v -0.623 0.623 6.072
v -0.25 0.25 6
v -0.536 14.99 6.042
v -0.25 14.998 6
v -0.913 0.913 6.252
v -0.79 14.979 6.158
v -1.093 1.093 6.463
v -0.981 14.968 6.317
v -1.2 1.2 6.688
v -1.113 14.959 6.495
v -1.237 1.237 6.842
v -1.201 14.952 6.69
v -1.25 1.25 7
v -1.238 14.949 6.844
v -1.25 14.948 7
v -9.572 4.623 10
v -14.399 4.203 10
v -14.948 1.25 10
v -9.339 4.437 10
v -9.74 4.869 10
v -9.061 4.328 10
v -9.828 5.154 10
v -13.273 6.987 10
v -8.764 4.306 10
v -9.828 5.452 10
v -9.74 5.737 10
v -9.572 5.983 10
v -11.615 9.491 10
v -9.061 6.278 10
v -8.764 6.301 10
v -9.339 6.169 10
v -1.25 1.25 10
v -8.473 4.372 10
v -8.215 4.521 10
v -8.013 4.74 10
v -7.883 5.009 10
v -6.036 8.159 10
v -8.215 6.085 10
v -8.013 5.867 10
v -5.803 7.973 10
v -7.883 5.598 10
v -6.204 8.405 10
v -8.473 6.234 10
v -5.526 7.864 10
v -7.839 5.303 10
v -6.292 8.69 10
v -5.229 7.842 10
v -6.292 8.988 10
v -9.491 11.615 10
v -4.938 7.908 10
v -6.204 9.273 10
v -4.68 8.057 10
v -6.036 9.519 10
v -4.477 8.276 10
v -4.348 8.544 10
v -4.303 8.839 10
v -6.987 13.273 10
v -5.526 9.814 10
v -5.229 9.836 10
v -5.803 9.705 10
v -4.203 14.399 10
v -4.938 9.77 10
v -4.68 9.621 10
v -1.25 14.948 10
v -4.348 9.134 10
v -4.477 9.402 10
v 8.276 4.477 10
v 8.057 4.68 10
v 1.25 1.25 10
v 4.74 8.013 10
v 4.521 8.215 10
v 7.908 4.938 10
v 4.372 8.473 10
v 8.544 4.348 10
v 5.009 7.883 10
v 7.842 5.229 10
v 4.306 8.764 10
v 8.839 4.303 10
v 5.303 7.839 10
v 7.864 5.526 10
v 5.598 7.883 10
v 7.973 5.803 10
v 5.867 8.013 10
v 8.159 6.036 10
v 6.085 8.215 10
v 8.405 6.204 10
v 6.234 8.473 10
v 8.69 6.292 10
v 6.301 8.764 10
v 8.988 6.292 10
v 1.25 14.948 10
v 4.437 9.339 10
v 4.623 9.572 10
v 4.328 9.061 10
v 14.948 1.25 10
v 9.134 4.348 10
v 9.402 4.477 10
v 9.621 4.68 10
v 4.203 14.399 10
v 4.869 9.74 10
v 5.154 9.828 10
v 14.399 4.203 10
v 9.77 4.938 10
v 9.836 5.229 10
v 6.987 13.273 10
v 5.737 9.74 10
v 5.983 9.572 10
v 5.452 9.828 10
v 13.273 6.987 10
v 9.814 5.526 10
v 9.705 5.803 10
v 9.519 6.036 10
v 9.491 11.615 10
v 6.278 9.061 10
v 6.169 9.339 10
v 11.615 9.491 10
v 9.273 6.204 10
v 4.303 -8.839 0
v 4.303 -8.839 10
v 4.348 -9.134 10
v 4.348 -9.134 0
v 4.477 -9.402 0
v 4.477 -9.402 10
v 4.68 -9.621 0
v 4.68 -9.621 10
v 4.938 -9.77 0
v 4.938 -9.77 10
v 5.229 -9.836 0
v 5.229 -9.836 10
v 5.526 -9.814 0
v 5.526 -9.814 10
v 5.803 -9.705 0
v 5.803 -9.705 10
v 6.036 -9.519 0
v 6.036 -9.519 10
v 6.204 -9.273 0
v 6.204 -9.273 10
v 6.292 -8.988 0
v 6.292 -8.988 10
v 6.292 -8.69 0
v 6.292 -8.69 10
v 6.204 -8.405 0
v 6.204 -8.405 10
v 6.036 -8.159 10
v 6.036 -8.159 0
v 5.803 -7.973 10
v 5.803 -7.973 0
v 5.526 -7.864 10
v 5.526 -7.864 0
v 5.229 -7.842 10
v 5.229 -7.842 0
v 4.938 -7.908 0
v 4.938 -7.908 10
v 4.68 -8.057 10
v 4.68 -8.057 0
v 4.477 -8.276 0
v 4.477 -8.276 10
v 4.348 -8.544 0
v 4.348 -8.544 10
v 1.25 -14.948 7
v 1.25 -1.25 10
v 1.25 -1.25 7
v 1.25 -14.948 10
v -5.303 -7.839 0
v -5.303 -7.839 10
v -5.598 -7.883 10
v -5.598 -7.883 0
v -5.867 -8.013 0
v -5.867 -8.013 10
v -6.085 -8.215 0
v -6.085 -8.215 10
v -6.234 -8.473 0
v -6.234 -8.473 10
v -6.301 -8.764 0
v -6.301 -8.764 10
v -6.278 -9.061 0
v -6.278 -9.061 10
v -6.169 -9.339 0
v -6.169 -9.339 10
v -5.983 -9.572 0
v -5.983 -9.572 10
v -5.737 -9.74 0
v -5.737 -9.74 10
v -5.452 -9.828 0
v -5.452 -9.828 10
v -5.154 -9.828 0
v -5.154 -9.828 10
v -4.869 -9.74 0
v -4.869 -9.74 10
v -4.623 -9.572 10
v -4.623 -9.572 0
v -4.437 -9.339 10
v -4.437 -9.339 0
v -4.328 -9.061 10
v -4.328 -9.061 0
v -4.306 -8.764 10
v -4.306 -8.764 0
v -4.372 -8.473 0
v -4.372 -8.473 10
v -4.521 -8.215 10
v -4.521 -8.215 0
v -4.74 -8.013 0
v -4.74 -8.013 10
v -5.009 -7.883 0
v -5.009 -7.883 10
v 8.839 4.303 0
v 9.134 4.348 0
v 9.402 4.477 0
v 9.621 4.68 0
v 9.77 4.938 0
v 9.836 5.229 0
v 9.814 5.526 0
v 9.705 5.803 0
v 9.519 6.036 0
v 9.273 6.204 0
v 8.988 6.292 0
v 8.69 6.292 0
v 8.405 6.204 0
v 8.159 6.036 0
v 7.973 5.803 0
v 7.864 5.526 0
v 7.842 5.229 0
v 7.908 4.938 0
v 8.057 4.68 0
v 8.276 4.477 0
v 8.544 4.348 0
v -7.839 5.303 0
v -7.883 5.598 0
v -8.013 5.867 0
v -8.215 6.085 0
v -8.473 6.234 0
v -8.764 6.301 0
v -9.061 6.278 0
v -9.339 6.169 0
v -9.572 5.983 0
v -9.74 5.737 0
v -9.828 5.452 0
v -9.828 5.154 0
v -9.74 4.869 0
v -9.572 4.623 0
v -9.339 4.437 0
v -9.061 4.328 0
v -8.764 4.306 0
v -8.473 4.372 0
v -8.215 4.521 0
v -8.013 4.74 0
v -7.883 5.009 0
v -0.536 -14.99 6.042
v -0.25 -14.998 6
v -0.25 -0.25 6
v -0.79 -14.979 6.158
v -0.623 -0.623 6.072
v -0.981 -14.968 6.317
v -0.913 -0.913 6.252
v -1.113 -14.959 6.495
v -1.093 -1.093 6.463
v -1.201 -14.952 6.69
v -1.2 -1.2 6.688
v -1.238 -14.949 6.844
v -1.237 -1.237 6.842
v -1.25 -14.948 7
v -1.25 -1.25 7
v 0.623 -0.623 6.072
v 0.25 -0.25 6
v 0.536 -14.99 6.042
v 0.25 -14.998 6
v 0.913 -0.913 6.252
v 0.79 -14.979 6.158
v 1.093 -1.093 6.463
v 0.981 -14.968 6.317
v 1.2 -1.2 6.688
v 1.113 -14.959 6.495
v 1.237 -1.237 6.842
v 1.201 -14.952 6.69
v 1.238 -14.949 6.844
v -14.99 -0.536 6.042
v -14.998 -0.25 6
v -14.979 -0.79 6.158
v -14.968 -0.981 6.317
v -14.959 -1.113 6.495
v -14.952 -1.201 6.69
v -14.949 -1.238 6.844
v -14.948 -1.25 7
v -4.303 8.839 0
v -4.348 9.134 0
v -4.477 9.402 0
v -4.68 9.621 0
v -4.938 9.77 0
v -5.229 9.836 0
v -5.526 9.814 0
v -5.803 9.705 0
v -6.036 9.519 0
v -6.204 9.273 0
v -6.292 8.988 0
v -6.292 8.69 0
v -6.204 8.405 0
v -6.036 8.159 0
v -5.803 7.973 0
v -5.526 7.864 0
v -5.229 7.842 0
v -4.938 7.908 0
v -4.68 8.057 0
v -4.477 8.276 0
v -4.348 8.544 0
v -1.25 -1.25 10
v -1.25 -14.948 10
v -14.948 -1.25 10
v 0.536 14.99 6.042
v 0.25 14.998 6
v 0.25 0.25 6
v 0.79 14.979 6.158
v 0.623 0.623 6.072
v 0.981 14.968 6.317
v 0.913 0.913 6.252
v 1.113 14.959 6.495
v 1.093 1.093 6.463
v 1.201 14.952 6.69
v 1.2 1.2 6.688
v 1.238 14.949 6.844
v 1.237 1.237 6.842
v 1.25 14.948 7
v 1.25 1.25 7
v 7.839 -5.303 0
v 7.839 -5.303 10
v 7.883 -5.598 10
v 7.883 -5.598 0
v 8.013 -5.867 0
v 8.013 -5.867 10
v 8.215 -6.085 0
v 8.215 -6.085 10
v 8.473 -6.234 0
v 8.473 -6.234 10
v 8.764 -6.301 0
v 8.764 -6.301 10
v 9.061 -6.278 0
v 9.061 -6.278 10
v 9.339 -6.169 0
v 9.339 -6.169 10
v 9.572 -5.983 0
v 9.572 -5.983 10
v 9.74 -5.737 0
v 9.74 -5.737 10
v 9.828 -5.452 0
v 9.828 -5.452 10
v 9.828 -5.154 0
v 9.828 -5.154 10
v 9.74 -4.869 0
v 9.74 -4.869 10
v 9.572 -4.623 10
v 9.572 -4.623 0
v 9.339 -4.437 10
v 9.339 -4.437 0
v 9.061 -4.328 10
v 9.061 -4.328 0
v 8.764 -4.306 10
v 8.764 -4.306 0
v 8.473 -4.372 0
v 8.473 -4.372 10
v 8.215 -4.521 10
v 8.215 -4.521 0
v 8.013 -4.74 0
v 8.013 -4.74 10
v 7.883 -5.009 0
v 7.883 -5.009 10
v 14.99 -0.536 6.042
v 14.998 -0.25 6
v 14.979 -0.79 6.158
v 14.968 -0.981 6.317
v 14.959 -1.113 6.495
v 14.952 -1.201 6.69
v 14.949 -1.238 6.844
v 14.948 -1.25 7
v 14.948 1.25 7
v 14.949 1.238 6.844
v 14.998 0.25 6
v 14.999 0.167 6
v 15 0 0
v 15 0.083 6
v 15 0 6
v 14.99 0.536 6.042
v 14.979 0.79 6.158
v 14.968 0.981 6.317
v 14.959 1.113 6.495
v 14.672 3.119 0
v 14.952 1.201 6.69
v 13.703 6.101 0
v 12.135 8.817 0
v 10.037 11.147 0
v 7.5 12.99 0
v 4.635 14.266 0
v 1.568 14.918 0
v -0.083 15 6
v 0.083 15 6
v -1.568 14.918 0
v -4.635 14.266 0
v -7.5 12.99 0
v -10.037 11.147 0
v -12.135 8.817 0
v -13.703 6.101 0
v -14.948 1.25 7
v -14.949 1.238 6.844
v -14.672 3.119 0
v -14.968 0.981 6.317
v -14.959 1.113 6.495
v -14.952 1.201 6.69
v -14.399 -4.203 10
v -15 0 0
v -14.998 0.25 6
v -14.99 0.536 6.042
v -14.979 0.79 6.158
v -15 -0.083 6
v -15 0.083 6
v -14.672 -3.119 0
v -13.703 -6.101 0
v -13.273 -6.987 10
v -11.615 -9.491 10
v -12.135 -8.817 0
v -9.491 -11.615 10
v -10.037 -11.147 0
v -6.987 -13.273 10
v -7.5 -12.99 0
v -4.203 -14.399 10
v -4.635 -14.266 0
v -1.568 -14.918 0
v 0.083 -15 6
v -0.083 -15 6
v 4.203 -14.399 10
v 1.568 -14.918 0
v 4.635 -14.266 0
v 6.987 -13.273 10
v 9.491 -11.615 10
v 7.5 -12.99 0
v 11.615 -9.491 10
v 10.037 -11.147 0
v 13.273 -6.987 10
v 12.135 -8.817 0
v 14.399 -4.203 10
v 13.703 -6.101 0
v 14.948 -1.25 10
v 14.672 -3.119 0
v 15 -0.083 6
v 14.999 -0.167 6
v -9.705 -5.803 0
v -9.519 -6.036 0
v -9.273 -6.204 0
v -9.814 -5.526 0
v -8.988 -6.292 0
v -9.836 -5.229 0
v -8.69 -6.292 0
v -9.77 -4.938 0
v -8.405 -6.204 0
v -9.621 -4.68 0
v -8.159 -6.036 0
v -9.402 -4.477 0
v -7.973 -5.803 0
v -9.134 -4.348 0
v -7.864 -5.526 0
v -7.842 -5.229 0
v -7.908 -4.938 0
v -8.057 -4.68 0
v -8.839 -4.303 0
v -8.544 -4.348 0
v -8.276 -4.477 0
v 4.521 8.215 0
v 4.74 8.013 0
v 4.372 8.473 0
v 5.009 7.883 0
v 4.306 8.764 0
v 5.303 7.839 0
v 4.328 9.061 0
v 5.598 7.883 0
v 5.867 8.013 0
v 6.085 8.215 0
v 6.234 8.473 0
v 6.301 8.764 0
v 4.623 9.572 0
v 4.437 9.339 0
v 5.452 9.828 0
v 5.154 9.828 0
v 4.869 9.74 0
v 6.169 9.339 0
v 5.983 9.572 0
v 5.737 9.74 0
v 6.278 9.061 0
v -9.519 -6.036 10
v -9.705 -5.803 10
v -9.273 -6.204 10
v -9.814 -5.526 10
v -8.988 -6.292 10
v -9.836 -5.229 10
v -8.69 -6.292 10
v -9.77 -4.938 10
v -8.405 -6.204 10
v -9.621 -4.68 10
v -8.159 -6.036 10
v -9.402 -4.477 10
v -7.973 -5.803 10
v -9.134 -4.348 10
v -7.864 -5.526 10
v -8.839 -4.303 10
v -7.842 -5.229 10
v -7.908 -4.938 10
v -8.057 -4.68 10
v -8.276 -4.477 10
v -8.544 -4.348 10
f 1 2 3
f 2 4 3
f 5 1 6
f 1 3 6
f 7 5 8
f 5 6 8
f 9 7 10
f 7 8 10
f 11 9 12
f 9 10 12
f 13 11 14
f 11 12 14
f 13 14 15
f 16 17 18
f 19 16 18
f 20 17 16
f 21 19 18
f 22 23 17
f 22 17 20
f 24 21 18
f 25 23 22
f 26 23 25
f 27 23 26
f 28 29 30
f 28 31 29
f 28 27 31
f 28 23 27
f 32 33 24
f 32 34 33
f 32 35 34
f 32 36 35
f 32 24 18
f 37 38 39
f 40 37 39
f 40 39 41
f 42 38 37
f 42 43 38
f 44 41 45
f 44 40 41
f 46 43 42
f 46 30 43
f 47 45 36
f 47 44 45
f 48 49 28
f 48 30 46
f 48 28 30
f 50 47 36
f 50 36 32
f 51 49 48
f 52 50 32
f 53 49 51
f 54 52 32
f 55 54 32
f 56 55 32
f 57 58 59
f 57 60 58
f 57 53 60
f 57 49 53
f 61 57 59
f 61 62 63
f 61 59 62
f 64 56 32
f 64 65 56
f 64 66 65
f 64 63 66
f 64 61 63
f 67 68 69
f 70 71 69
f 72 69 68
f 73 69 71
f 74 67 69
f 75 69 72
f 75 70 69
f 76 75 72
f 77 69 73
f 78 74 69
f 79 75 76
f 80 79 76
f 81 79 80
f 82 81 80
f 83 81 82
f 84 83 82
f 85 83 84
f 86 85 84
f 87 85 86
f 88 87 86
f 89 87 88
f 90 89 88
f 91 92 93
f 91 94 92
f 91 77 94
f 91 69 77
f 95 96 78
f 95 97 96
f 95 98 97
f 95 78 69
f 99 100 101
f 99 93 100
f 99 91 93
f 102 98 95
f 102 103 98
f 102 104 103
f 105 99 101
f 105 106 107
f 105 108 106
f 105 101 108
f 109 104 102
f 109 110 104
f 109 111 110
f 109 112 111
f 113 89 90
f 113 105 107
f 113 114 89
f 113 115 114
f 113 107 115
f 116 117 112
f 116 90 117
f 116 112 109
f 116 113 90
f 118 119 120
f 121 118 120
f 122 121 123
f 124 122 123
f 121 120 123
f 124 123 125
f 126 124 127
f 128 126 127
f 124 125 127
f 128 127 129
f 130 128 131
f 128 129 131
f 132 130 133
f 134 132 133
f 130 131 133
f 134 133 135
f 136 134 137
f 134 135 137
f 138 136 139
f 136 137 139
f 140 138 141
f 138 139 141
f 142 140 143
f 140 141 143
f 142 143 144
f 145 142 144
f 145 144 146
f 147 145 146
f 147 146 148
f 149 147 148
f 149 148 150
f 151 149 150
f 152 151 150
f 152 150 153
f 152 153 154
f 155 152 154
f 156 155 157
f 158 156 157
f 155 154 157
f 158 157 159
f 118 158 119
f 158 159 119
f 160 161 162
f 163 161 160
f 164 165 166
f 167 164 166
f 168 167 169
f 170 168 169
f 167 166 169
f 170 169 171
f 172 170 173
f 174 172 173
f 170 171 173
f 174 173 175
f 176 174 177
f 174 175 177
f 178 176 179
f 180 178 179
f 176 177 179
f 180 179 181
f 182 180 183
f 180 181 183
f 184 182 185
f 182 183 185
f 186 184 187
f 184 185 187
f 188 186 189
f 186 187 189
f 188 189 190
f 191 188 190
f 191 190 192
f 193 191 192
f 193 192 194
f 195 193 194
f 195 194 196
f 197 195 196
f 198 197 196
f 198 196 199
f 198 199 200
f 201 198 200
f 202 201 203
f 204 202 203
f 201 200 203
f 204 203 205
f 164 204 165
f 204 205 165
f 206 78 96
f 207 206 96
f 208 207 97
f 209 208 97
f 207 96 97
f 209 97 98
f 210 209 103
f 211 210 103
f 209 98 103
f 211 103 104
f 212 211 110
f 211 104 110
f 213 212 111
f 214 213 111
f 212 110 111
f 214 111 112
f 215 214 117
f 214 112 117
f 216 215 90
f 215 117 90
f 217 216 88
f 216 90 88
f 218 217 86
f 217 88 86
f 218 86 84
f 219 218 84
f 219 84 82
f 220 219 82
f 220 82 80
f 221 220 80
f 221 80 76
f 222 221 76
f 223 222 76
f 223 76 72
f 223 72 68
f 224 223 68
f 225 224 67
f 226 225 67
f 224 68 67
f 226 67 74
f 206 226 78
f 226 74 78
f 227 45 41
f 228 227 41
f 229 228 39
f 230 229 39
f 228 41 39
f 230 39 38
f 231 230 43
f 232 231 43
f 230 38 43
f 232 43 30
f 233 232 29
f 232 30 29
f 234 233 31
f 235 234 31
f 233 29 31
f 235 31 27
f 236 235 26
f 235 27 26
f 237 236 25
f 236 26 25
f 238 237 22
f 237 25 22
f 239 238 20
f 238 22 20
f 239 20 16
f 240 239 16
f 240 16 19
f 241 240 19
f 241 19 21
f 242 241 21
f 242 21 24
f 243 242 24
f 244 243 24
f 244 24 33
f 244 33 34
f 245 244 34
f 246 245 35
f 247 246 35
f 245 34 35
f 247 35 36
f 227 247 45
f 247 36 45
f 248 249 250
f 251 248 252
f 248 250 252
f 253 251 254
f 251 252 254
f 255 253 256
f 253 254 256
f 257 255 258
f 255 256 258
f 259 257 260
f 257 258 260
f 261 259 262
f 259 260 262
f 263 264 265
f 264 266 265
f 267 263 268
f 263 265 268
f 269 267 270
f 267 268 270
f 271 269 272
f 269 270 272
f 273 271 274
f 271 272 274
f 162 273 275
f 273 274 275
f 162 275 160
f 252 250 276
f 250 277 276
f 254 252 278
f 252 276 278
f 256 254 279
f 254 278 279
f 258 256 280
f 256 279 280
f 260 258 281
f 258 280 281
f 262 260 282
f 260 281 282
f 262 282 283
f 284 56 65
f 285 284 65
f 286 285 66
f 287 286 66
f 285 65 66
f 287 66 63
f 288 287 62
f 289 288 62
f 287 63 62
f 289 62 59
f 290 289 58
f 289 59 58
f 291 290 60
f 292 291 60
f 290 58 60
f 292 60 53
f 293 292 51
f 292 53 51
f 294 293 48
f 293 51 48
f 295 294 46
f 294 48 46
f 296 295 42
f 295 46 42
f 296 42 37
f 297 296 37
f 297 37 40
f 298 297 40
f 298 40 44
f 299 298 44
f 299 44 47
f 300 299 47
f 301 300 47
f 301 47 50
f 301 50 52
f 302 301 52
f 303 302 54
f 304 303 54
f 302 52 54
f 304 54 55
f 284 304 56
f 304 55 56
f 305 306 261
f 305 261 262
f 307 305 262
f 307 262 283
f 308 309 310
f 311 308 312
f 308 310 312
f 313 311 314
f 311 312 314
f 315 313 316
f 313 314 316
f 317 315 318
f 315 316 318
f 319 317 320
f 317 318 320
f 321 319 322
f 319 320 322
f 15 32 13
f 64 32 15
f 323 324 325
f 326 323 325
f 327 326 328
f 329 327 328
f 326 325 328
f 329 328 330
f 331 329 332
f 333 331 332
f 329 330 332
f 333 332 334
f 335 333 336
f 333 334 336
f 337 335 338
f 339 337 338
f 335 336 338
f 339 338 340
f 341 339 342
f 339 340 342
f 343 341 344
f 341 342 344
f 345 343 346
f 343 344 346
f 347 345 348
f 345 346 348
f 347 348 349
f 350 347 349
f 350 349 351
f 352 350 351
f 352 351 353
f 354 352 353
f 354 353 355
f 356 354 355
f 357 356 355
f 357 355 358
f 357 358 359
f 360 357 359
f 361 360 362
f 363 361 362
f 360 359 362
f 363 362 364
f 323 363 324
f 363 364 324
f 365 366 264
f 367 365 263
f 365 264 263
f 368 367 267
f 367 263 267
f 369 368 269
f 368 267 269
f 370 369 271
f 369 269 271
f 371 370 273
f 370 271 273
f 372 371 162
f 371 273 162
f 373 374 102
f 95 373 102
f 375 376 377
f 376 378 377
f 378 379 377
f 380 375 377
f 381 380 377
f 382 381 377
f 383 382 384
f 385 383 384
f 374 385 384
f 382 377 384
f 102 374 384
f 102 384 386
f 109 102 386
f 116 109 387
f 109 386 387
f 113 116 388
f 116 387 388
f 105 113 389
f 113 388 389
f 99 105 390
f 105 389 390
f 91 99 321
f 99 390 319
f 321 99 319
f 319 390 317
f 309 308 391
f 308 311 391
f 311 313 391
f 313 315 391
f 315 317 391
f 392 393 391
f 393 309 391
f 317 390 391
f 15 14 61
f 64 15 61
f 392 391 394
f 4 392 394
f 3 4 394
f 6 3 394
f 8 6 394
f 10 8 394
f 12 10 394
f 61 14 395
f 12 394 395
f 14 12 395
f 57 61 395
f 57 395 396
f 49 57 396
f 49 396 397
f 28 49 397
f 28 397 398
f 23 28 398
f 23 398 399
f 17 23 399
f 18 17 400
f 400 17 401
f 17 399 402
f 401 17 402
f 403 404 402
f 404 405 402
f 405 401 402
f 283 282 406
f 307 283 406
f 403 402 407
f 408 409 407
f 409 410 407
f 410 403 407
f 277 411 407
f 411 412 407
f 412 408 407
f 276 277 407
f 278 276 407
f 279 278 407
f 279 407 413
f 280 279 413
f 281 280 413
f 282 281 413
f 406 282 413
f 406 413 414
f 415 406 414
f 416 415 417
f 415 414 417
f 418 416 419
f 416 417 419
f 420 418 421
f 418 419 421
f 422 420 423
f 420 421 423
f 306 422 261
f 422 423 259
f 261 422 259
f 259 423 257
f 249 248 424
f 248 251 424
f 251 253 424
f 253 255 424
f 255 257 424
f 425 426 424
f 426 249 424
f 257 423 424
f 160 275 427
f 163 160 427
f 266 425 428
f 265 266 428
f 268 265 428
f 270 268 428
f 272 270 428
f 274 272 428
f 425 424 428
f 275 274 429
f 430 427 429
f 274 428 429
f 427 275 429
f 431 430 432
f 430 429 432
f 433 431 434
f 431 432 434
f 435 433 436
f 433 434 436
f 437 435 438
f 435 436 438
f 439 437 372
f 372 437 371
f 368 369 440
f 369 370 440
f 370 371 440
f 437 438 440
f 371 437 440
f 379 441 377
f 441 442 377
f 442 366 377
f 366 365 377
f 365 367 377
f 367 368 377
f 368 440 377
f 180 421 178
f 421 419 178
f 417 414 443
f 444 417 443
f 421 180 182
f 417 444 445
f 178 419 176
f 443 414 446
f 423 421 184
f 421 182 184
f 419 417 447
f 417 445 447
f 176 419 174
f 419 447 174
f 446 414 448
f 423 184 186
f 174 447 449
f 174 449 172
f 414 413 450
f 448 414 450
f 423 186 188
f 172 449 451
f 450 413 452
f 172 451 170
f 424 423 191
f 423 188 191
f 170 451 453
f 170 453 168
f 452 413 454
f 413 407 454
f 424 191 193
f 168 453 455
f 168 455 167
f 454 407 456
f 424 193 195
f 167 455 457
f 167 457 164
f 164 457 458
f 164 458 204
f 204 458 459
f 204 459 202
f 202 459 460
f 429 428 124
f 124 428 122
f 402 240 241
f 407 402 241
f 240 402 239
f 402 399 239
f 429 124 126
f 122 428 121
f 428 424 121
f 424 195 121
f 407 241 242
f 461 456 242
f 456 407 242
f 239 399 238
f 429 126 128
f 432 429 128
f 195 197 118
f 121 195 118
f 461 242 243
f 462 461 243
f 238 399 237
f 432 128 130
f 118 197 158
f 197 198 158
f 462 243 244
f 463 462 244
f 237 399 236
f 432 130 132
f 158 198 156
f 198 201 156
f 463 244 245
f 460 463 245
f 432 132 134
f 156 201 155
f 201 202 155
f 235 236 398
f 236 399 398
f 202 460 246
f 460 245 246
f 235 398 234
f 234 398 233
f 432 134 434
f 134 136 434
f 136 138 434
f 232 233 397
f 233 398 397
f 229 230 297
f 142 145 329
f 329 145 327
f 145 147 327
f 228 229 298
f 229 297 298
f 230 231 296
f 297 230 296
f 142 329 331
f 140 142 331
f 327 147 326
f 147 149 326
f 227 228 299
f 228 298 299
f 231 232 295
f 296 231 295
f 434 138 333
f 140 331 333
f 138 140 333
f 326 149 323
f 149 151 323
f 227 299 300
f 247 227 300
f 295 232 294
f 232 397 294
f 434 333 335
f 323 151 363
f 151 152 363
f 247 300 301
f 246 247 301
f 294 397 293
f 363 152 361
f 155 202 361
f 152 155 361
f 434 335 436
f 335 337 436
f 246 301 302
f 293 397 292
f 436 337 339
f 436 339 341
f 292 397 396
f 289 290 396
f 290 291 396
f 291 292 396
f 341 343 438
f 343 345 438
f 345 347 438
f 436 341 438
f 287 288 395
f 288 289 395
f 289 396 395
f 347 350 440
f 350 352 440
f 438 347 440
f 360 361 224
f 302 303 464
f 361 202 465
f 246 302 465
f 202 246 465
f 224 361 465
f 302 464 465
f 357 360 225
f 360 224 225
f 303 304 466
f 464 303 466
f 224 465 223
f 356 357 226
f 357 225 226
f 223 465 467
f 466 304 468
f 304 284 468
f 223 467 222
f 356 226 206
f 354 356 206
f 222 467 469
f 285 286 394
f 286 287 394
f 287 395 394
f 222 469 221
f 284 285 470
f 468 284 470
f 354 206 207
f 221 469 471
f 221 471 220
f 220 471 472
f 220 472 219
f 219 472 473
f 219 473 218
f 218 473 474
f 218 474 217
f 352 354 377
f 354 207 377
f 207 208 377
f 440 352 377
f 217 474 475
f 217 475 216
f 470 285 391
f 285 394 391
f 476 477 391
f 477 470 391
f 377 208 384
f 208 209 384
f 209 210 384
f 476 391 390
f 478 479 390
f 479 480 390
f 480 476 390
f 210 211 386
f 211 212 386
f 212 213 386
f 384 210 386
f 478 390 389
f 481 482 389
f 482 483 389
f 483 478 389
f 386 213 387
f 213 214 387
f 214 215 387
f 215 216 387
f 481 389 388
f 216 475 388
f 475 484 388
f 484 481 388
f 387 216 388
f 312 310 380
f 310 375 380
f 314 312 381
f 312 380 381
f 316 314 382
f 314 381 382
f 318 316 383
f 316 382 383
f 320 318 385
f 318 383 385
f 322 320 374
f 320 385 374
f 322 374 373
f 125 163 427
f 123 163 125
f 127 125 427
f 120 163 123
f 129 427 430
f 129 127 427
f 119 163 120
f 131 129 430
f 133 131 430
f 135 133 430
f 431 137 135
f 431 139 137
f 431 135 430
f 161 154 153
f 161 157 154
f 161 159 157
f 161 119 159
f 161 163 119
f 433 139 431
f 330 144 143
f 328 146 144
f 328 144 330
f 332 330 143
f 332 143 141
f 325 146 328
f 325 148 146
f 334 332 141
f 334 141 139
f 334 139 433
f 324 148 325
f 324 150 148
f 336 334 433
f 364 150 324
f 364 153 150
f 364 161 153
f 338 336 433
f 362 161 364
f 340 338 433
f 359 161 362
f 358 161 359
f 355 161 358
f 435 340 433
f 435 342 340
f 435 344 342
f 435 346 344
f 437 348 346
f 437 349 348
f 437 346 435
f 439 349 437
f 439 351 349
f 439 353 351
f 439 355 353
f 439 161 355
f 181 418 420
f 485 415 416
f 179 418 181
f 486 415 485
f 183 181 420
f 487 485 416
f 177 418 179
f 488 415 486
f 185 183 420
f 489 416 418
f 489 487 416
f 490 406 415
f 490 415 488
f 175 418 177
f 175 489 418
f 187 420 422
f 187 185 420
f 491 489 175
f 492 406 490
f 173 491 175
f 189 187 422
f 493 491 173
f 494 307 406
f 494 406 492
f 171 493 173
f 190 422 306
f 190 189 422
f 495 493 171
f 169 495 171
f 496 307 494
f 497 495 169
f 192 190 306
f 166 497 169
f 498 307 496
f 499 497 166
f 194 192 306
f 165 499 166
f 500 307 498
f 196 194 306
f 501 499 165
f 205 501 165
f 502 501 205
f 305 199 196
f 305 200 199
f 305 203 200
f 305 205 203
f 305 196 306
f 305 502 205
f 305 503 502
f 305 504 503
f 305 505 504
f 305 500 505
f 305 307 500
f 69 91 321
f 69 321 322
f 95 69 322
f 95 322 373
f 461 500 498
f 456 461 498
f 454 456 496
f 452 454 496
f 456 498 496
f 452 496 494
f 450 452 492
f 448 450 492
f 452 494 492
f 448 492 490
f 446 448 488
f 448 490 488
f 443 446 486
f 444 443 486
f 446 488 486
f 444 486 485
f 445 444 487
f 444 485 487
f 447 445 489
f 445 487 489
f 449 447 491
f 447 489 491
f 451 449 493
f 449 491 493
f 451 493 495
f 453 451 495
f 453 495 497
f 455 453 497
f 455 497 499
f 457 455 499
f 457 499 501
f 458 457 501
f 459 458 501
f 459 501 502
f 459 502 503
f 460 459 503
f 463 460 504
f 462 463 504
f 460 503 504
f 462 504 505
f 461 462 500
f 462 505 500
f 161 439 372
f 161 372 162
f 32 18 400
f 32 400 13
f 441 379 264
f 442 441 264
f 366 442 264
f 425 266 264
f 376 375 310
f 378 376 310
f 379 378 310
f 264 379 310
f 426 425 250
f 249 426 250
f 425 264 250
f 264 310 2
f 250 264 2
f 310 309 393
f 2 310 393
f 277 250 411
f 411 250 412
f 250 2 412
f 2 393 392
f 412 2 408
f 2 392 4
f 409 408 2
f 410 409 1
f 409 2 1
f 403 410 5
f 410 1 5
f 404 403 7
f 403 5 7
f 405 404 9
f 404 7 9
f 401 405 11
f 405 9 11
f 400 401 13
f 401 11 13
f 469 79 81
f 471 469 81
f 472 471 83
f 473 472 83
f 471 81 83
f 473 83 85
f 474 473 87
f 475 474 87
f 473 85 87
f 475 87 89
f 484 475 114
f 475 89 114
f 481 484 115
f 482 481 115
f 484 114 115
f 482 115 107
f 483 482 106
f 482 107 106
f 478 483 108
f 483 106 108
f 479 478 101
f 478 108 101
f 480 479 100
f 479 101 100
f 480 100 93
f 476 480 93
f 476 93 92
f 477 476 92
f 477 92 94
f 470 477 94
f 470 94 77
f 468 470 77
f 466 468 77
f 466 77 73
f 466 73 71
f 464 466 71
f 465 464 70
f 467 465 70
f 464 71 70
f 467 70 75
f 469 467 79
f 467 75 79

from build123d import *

# Parameters (mm, degrees)
SKETCH2_R           = 15
BOSS_EXTRUDE1_DEPTH = 10
CUT_EXTRUDE1_DEPTH  = 4
FILLET1_R           = 1
SKETCH4_R           = 1
CUT_EXTRUDE2_DEPTH  = 10
CIRPATTERN1_COUNT   = 4


with BuildPart() as part:
    # Sketch2 → Boss-Extrude1 (new body)
    with BuildSketch(Plane.XY):
        Circle(SKETCH2_R)
    extrude(amount=BOSS_EXTRUDE1_DEPTH)

    # Sketch3 → Cut-Extrude1 (cut)
    with BuildSketch(Plane.XY.offset(10)):
        Polygon((-1.25, 1.25), (-1.25, 15.296025934), (1.25, 15.296025934), (1.25, 1.25), (15.674686846, 1.25), (15.674686846, -1.25), (1.25, -1.25), (1.25, -15.629214974), (-1.25, -15.629214974), (-1.25, -1.25), (-15.410512851, -1.25), (-15.410512851, 1.25), align=None)
    extrude(amount=-CUT_EXTRUDE1_DEPTH, mode=Mode.SUBTRACT)

    # Fillet1
    fillet1_edges = [part.edges().sort_by_distance(p)[0] for p in [
        (-8.098912964, 1.25, 6),
        (-1.25, 8.098912964, 6),
        (1.25, 8.098912964, 6),
        (8.098912964, 1.25, 6),
        (8.098912964, -1.25, 6),
        (1.25, -8.098912964, 6),
        (-1.25, -8.098912964, 6),
        (-8.098912964, -1.25, 6),
    ]]
    fillet(fillet1_edges, radius=FILLET1_R)

    # Sketch4 → Cut-Extrude2 (cut)
    with BuildSketch(Plane.XY.offset(10)):
        with Locations((-5.303300859, 8.838834765)):
            Circle(SKETCH4_R)
        with Locations((-8.838834765, 5.303300859)):
            Circle(SKETCH4_R)
    cut_extrude2 = extrude(amount=-CUT_EXTRUDE2_DEPTH, mode=Mode.SUBTRACT)

    # CirPattern1: Cut-Extrude2 ×4 about axis
    cirpattern1_axis = Axis((0, 0, 0), (0, 0, 1))
    for i in range(1, CIRPATTERN1_COUNT):
        add(cut_extrude2.rotate(cirpattern1_axis, i * 360 / CIRPATTERN1_COUNT), mode=Mode.SUBTRACT)


solid = part.part
